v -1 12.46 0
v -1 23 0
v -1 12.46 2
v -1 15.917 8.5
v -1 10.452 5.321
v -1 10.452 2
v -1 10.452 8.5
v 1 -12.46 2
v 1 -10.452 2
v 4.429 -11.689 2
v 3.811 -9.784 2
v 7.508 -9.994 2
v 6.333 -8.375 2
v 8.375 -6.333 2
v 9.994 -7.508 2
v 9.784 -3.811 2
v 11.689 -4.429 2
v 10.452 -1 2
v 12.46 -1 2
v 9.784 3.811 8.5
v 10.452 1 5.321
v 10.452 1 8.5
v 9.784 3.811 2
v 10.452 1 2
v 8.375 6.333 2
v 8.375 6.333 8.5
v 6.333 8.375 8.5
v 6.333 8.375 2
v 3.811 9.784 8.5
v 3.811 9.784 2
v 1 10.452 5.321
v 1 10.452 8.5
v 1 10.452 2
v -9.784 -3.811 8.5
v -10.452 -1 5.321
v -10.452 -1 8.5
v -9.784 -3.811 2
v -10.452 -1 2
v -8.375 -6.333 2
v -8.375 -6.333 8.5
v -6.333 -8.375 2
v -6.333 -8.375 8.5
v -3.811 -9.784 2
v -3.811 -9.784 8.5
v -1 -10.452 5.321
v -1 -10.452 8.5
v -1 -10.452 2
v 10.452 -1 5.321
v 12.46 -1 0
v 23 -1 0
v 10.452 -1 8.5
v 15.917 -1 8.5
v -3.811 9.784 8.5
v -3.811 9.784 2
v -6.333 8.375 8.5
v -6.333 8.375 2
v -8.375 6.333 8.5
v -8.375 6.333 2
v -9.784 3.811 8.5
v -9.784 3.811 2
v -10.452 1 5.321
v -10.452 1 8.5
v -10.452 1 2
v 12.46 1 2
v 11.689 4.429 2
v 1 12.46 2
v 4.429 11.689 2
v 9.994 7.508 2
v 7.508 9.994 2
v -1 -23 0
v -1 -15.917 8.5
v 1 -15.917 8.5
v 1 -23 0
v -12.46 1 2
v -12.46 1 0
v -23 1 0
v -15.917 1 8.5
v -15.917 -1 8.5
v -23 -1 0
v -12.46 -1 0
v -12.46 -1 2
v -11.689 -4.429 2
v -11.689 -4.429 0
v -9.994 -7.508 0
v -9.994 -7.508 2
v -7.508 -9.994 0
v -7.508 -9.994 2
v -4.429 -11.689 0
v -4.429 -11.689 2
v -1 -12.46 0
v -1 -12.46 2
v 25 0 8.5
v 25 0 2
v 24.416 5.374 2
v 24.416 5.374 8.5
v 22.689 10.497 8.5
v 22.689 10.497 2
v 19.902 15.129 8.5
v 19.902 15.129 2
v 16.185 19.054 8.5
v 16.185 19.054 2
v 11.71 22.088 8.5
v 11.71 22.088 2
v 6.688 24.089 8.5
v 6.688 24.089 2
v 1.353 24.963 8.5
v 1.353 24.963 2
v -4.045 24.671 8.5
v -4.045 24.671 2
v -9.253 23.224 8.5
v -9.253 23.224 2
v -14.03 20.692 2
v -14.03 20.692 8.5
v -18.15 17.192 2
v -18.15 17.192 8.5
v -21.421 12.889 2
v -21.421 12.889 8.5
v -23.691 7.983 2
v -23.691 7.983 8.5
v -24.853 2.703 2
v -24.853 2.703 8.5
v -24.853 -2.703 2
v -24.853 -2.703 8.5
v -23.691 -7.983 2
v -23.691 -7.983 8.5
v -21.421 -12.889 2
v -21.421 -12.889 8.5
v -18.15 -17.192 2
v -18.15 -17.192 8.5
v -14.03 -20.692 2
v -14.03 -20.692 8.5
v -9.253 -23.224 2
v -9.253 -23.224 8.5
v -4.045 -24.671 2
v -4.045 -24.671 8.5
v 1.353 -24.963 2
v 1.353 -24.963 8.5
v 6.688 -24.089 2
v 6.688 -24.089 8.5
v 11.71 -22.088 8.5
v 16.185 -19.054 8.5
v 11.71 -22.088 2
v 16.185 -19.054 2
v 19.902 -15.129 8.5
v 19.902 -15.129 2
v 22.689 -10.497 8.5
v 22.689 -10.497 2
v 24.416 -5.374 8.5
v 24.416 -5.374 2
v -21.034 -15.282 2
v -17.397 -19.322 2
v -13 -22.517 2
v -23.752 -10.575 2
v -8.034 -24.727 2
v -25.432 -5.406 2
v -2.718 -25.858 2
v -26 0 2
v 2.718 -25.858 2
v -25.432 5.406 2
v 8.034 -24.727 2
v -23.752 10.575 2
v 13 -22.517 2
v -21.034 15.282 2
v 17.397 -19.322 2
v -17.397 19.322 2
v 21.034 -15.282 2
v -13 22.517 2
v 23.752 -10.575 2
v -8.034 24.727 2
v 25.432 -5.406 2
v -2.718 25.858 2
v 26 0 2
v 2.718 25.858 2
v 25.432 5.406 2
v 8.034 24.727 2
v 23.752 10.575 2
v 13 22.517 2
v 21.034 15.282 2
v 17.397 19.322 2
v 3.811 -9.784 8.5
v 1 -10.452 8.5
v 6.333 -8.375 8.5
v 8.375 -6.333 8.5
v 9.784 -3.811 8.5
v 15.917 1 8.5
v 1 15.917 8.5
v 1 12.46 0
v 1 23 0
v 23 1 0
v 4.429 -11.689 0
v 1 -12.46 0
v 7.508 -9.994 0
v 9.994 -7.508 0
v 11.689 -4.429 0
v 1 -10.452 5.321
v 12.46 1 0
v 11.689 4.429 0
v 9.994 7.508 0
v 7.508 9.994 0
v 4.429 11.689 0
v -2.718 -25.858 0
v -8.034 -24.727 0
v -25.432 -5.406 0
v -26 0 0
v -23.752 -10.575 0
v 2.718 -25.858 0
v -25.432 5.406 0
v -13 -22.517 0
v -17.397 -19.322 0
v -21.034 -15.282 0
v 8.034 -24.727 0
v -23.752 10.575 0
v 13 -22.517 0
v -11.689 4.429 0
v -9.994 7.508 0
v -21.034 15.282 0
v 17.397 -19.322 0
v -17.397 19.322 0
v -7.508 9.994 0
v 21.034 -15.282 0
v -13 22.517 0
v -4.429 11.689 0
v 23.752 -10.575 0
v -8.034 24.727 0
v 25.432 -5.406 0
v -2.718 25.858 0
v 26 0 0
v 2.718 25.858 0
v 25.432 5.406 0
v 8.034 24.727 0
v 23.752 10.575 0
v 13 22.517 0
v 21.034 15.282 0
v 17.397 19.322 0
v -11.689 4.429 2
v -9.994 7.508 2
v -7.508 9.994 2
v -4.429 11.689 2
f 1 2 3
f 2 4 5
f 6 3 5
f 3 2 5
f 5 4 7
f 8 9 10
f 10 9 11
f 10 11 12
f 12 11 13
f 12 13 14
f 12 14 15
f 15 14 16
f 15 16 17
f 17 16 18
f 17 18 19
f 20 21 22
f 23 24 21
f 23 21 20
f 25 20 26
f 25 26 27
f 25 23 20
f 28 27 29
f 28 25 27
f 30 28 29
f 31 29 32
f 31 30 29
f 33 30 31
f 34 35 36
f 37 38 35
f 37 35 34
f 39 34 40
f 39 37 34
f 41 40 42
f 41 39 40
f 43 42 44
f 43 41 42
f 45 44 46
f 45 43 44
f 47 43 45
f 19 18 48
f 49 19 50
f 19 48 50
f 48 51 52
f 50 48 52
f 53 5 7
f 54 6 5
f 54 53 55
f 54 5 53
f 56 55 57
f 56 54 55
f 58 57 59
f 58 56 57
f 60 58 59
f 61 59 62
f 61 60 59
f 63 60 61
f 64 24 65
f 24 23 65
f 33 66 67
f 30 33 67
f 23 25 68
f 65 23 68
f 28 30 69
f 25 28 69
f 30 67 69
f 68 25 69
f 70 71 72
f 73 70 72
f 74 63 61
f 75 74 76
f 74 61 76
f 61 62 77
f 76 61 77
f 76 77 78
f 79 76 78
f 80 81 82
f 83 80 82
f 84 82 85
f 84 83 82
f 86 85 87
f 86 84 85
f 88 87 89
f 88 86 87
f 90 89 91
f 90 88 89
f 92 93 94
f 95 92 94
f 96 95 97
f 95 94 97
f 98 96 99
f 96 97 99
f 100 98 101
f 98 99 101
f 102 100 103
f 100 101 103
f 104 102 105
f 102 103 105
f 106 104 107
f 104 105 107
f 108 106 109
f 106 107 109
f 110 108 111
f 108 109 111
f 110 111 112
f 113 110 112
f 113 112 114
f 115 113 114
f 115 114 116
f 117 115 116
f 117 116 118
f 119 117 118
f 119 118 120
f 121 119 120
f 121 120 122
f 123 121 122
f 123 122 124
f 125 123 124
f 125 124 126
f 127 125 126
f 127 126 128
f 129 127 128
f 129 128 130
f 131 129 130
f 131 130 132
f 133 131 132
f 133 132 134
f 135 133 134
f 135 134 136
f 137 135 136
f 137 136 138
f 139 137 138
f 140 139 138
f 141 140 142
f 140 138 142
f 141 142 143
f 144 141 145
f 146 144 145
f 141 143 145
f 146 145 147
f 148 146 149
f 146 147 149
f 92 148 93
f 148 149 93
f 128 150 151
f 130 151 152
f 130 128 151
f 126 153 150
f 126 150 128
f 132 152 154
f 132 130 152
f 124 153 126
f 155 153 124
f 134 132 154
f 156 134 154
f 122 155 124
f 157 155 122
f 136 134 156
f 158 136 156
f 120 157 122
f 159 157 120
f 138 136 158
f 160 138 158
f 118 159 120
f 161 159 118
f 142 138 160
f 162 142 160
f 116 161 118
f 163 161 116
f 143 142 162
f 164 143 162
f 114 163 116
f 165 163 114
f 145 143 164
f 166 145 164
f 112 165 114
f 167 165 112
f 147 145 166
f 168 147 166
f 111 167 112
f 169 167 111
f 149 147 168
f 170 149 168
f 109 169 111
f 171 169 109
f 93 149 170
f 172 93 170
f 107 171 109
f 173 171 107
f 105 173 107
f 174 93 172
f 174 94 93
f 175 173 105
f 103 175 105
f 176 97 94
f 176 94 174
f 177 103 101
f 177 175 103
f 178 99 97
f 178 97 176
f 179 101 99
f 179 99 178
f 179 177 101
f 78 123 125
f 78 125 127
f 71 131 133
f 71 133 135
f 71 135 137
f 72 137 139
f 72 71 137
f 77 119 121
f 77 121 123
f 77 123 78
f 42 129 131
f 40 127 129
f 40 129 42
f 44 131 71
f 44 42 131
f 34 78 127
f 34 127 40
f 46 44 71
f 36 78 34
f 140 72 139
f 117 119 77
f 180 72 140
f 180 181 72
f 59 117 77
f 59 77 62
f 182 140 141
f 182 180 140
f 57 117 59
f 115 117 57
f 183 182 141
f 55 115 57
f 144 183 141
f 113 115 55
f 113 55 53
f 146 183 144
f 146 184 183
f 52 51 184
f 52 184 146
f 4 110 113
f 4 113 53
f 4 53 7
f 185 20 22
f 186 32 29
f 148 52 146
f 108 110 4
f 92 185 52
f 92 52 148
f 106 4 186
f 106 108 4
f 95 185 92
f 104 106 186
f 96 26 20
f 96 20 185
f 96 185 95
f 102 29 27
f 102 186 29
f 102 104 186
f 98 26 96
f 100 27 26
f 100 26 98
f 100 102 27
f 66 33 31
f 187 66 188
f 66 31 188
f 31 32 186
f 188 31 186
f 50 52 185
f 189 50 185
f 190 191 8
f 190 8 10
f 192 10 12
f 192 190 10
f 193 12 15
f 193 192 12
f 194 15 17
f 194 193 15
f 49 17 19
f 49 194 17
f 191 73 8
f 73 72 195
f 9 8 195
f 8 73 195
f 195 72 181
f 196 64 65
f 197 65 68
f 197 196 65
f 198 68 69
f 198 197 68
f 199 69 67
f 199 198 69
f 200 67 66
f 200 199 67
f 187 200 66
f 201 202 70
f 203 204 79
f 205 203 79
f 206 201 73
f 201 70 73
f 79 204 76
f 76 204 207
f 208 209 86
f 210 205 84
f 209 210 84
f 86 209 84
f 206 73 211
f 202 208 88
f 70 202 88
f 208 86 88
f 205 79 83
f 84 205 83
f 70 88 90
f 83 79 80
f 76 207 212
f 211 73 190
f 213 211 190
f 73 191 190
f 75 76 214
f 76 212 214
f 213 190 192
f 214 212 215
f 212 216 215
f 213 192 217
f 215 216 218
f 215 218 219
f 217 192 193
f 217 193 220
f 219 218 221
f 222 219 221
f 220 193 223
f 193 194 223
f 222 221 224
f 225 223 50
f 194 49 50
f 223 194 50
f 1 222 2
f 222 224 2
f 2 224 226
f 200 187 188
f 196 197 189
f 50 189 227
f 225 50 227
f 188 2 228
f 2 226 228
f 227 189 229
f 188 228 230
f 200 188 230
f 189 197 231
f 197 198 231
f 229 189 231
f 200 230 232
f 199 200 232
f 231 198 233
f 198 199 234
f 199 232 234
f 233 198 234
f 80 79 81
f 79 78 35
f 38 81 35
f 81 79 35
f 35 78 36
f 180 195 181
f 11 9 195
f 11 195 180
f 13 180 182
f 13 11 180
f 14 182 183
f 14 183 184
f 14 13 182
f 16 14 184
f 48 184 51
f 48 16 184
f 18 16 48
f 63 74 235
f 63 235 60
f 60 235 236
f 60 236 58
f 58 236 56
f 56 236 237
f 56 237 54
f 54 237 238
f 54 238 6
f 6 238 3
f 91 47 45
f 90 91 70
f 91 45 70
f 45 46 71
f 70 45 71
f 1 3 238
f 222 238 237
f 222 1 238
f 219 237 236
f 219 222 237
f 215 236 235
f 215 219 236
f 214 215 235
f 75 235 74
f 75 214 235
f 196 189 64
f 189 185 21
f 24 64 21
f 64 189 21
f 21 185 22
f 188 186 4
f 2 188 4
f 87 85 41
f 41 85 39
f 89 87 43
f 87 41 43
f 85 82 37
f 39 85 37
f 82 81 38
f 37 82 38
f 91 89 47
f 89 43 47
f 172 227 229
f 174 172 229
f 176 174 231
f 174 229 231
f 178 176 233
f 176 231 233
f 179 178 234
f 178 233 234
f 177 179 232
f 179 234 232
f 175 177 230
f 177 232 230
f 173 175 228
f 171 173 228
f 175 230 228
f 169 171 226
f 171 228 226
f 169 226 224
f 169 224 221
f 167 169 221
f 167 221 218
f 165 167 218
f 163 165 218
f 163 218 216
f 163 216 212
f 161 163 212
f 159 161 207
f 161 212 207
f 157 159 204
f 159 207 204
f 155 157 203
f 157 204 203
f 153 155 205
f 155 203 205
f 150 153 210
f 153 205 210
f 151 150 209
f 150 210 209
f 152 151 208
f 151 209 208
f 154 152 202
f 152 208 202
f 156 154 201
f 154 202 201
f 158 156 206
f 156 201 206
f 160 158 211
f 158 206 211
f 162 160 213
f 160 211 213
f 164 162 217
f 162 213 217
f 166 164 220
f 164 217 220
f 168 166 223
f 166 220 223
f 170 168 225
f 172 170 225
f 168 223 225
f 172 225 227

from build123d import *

# Parameters (mm, degrees)
SKETCH_R      = 26
SKETCH_R_2    = 10.5
PAD_DEPTH     = 2
SKETCH001_R   = 25
SKETCH001_R_2 = 10.5
PAD001_DEPTH  = 8.5
SKETCH004_R   = 12.5
POCKET_DEPTH  = 2


with BuildPart() as part:
    # Sketch → Pad (new body)
    with BuildSketch(Plane.XY):
        Circle(SKETCH_R)
        Circle(SKETCH_R_2, mode=Mode.SUBTRACT)
    extrude(amount=PAD_DEPTH)

    # Sketch001 → Pad001 (join)
    with BuildSketch(Plane.XY):
        Circle(SKETCH001_R)
        Circle(SKETCH001_R_2, mode=Mode.SUBTRACT)
    extrude(amount=PAD001_DEPTH)

    # Sketch002 → SubtractiveLoft section 0
    with BuildSketch(Plane.XY):
        Polygon((1, 23), (-1, 23), (-1, 1), (-23, 1), (-23, -1), (-1, -1), (-1, -23), (1, -23), (1, -1), (23, -1), (23, 1), (1, 1), align=None)
    # Sketch003 → SubtractiveLoft section 1
    with BuildSketch(Plane.XY.offset(12)):
        Polygon((1, 13), (-1, 13), (-1, 1), (-13, 1), (-13, -1), (-1, -1), (-1, -13), (1, -13), (1, -1), (13, -1), (13, 1), (1, 1), align=None)
    loft(mode=Mode.SUBTRACT)

    # Sketch004 → Pocket (cut)
    with BuildSketch(Plane.XY):
        Circle(SKETCH004_R)
    extrude(amount=POCKET_DEPTH, mode=Mode.SUBTRACT)


solid = part.part
